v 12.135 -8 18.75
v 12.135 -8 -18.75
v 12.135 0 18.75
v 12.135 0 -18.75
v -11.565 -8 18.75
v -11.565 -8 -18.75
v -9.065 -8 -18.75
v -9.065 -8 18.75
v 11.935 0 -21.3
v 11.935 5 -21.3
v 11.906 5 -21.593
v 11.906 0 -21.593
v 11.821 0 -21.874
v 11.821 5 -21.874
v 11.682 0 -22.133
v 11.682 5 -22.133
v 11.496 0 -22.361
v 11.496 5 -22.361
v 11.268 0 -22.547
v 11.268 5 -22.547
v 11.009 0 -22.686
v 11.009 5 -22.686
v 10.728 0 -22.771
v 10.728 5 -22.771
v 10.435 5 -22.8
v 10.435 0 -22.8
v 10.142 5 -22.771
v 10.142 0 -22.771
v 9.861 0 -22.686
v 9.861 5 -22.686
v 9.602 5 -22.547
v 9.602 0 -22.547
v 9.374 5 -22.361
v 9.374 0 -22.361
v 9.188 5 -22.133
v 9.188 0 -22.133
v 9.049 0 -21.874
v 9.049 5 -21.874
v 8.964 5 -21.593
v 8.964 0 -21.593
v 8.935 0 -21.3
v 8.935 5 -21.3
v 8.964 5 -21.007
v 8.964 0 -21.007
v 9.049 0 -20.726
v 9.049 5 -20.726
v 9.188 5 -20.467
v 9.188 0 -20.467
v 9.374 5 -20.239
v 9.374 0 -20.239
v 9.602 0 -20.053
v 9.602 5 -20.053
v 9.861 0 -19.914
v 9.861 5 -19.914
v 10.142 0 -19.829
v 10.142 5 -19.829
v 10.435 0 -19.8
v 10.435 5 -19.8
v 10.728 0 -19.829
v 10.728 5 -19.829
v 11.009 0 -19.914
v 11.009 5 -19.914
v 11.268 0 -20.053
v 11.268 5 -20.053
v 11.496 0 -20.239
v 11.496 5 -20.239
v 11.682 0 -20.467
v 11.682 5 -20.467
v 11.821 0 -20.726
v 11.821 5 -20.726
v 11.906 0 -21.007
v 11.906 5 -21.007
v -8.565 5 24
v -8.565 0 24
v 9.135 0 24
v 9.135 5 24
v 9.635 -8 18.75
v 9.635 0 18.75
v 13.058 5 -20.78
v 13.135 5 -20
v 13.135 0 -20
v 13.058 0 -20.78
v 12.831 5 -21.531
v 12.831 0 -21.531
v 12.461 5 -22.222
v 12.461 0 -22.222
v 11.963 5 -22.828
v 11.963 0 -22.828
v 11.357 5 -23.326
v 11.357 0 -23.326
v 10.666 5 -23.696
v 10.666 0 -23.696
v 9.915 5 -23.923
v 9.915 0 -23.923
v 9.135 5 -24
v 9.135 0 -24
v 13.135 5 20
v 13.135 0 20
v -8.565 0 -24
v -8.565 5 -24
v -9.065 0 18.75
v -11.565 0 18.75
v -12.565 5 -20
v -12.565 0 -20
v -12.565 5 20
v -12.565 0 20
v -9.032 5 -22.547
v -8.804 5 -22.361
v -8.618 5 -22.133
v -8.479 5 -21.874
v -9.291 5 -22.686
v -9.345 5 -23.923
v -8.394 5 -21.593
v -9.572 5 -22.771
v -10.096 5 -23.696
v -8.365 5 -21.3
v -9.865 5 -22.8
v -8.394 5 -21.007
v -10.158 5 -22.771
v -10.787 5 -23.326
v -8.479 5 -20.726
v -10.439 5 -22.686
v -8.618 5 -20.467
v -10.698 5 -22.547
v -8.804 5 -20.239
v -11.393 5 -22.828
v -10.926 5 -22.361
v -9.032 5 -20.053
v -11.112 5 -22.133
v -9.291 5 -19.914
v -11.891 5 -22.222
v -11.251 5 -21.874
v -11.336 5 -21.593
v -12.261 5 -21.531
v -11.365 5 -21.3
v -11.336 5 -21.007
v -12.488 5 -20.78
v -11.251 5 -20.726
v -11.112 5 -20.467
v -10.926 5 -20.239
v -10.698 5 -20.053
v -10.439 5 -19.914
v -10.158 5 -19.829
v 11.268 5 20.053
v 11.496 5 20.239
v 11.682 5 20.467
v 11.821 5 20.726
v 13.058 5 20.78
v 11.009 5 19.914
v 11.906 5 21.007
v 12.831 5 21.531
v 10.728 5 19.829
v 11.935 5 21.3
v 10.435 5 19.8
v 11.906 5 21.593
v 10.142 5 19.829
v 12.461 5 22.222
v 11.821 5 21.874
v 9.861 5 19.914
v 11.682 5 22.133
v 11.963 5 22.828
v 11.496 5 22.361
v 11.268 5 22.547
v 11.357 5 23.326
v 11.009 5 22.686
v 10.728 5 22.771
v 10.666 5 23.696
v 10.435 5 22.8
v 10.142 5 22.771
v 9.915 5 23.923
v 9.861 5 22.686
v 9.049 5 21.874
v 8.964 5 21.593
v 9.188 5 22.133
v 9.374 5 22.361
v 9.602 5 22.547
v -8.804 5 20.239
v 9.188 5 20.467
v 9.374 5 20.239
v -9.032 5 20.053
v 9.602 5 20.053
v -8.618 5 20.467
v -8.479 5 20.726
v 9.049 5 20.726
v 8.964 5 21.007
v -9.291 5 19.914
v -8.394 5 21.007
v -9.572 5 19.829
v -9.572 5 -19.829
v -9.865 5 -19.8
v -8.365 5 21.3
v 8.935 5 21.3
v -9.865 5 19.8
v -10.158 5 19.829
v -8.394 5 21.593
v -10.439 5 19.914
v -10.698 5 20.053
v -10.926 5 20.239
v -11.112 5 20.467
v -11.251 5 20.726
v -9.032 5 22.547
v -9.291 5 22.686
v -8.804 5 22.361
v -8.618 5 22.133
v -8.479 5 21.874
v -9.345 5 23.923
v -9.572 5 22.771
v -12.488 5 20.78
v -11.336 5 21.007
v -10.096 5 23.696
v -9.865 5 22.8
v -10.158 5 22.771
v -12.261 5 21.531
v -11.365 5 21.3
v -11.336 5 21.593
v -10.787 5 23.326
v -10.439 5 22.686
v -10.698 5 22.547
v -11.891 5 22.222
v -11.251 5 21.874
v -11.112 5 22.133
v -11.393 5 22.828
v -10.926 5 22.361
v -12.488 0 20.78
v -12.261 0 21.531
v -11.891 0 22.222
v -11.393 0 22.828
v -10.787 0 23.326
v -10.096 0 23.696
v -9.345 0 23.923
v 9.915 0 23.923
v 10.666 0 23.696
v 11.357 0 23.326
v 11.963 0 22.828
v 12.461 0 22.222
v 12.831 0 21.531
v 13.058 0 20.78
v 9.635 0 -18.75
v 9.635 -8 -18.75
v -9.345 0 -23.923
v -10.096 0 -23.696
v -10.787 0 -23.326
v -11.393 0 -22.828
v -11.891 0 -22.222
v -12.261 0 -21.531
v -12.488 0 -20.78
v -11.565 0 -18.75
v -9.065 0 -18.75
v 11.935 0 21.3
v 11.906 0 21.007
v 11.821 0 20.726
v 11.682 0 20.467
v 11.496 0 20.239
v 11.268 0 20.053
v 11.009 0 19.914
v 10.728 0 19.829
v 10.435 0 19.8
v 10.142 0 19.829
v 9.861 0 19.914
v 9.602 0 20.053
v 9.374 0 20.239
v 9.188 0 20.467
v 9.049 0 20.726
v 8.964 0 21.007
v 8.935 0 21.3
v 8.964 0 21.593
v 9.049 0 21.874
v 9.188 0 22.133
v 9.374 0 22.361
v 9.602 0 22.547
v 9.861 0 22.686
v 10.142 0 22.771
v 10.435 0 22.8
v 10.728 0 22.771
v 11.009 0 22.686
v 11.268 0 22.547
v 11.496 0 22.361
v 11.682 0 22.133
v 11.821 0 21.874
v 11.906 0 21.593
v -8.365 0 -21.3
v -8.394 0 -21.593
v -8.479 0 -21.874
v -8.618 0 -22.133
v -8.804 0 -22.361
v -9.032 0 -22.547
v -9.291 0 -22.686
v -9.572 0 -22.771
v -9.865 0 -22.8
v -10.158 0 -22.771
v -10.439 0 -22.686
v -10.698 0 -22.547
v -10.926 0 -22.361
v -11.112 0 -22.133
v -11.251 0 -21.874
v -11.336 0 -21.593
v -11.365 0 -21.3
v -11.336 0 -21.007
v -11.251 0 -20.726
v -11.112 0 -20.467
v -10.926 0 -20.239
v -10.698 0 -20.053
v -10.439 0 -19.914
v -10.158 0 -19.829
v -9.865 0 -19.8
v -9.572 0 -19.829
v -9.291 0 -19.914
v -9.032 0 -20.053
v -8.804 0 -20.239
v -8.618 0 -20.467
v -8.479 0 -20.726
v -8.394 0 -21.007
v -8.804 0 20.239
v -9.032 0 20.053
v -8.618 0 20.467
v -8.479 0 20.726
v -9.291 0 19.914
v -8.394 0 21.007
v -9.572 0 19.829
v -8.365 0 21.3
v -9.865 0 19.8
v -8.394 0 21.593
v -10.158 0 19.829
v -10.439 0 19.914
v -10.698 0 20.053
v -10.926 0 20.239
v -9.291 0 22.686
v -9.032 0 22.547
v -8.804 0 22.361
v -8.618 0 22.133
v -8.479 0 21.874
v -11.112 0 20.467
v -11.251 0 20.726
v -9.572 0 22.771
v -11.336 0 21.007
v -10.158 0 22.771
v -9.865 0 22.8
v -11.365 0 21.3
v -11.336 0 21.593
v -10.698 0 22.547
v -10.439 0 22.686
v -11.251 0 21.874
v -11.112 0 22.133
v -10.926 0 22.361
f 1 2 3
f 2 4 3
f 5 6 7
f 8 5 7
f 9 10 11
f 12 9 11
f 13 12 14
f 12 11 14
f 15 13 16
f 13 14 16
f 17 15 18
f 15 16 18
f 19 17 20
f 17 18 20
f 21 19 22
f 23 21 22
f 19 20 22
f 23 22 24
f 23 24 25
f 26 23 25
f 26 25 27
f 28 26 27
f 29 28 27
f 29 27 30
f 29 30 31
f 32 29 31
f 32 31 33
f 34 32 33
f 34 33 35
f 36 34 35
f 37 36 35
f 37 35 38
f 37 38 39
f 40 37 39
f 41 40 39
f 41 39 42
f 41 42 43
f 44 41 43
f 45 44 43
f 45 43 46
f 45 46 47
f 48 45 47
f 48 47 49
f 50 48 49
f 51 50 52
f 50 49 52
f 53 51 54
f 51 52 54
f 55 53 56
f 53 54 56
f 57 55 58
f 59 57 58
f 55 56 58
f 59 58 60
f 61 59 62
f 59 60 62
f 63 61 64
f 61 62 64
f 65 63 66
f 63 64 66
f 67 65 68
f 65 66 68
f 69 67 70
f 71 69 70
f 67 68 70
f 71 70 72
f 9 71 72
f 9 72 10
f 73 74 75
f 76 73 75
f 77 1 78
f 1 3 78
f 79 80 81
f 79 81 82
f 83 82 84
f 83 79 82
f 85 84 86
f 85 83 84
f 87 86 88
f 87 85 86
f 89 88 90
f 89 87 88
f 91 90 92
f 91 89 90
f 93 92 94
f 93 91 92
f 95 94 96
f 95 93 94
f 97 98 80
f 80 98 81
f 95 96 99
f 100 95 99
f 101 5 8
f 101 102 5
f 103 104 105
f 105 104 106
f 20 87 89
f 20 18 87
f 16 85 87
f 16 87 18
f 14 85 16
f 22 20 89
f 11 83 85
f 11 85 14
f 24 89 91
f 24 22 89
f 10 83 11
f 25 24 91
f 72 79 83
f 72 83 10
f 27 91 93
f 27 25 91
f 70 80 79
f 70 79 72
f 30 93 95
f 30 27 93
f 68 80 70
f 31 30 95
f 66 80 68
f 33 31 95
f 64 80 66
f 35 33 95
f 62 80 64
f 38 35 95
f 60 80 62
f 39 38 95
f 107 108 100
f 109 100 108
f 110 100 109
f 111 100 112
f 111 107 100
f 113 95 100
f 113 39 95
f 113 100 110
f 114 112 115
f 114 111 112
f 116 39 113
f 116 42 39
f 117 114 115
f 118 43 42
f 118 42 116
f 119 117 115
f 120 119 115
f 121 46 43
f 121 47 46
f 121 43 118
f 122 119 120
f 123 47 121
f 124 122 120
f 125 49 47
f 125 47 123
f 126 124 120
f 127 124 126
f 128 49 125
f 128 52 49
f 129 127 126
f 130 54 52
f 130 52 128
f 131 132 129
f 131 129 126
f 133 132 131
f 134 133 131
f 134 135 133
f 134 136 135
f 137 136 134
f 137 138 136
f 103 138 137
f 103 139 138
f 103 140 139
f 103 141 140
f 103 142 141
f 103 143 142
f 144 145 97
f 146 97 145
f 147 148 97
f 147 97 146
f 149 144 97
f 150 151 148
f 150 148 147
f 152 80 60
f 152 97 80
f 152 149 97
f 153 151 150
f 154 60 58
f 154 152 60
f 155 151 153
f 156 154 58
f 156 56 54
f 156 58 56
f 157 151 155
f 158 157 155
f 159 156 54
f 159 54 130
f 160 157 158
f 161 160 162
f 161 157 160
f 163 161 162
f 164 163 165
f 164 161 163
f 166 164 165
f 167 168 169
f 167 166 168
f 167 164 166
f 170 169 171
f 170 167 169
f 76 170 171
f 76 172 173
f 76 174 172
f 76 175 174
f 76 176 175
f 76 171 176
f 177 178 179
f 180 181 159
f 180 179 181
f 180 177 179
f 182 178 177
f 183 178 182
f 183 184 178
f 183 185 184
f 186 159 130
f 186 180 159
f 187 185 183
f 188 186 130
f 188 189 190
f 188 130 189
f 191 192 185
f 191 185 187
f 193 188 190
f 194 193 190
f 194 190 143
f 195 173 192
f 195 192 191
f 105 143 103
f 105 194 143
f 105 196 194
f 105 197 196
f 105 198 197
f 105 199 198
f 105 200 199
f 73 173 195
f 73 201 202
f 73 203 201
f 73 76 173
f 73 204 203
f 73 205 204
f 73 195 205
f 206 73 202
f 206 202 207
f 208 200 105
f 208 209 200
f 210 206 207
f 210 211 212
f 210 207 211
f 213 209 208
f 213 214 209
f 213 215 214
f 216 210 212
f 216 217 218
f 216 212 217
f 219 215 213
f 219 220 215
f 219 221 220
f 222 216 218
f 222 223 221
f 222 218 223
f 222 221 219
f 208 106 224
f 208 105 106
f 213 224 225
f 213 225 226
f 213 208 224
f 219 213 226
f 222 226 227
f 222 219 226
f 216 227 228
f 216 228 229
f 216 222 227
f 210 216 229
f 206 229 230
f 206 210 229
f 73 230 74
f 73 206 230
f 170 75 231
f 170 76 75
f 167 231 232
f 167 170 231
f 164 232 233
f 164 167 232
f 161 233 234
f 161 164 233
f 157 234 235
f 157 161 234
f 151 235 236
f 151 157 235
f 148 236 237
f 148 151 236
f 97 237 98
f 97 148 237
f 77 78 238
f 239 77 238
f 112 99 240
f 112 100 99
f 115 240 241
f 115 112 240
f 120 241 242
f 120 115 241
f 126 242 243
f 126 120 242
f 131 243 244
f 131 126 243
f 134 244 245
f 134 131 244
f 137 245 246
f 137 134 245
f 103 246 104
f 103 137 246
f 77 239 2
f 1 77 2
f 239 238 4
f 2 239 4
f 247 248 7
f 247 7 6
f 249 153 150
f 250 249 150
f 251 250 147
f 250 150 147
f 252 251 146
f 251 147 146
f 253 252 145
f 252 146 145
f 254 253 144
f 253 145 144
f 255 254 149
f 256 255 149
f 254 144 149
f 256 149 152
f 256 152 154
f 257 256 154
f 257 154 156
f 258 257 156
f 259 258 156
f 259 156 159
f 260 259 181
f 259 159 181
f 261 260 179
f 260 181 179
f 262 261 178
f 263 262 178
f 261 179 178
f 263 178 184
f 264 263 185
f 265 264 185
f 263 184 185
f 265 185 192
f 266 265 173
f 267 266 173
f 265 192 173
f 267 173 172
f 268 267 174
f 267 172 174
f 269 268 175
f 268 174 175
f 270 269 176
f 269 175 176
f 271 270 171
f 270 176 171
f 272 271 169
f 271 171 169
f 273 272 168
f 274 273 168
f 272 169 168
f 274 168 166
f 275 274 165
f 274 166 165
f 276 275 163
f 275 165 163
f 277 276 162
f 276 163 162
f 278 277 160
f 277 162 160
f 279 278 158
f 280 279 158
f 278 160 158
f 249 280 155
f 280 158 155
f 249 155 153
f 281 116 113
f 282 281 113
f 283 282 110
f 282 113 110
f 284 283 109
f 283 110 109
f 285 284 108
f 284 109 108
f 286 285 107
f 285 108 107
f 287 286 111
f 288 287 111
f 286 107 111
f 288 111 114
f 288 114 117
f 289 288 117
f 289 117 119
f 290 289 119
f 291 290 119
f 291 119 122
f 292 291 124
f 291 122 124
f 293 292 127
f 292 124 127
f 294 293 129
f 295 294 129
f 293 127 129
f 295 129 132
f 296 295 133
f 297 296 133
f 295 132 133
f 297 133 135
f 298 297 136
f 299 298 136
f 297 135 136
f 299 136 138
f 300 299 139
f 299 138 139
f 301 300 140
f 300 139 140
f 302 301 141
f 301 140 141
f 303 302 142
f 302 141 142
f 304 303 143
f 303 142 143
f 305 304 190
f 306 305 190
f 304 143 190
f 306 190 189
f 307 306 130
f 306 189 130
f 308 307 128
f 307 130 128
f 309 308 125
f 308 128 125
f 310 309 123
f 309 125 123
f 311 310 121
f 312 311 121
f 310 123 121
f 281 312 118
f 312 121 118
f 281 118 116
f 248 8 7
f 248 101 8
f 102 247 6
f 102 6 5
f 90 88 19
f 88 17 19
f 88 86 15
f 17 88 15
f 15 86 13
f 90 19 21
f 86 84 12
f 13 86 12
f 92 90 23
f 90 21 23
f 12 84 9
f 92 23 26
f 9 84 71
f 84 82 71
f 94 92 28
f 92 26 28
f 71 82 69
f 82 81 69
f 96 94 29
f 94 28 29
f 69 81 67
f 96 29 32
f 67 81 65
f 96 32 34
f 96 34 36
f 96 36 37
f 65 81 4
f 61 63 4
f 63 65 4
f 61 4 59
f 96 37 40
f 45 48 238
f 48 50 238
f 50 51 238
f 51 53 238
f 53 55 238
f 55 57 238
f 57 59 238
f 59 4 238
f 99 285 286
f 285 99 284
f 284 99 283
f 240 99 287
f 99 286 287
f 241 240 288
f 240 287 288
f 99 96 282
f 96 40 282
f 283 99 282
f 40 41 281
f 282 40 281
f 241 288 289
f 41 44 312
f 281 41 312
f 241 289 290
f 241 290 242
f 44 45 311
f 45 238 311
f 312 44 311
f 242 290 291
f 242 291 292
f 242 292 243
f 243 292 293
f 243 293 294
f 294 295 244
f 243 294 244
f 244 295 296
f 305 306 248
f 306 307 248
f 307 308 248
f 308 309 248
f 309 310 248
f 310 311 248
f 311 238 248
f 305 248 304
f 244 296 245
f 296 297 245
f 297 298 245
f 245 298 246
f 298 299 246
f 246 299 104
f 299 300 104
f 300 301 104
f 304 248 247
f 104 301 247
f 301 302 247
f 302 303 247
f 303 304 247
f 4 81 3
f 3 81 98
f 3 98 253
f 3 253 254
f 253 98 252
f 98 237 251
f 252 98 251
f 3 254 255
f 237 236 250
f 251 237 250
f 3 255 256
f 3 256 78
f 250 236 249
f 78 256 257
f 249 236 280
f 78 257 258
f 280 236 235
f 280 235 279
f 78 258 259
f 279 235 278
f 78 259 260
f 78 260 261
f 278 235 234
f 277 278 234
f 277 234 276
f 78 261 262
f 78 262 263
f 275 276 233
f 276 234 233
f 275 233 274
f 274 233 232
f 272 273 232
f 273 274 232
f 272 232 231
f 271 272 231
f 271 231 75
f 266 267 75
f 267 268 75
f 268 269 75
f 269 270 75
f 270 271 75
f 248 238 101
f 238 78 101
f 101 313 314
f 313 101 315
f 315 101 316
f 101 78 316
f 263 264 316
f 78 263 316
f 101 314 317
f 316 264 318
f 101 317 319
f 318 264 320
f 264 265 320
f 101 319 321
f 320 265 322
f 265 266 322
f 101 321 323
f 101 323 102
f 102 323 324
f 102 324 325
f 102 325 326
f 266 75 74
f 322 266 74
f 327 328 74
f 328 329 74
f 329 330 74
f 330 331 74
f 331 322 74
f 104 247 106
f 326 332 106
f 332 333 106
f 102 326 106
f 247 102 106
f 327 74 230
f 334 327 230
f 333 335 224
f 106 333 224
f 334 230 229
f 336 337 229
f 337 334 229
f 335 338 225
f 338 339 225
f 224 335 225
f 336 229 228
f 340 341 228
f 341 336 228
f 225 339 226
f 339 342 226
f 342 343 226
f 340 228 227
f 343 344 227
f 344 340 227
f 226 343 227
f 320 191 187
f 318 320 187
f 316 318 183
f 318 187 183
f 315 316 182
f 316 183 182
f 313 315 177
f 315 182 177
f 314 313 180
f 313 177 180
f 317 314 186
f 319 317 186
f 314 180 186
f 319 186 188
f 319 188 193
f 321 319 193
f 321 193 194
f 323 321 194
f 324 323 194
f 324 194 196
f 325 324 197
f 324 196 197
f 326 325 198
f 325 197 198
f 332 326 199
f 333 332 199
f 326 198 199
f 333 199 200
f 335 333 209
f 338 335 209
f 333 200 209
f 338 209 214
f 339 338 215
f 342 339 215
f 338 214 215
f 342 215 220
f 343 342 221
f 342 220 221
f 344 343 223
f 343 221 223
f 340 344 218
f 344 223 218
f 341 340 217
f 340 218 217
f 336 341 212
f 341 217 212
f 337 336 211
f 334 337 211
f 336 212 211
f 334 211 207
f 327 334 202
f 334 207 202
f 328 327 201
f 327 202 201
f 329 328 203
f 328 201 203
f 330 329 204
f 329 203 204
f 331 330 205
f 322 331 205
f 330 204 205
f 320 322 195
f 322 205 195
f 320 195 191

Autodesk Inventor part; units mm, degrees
ref_plane "YZ Plane" through (0, 0, 0) normal (1, 0, 0) x (0, 1, 0)
ref_plane "XZ Plane" through (0, 0, 0) normal (0, 1, 0) x (-1, 0, 0)
ref_plane "XY Plane" through (0, 0, 0) normal (0, 0, 1) x (1, 0, 0)
sketch "Boceto1" plane through (0, 0, 0) normal (0, 1, 0) x (-1, 0, 0)
  line L0 (12.565, 24) -> (-13.135, 24)
  line L1 (-13.135, 24) -> (-13.135, -24)
  line L2 (-13.135, -24) -> (12.565, -24)
  line L3 (12.565, -24) -> (12.565, 24)
  point P0 (0, 0)
  point P1 (-0.285, -24)
  dimension "d0" = 48
  dimension "d1" = 25.7
  dimension "d2" = 12.565
  dimension "d3" = 24
extrude "Extrusión1" add sketch "Boceto1" along normal blind 5
fillet "Empalme1" radius 4 3 edges at (13.135, 2.5, 24) (13.135, 2.5, -24) (-12.565, 2.5, 24)
fillet "Empalme2" radius 4 1 edges at (-12.565, 2.5, -24)
sketch "Boceto2" plane through (0, 5, 0) normal (0, 1, 0) x (1, 0, 0)
  circle A0 centre (-9.865, -21.3) radius 1.5
  line L0 (-8.565, -24) -> (9.135, -24) projected
  line L1 (-12.565, 20) -> (-12.565, -20) projected
  line L2 (-31.929, 0) -> (35.0281, 0)
  circle A1 centre (-9.865, 21.3) radius 1.5
  line L3 (0.285, 24.6166) -> (0.285, -27.3805)
  circle A2 centre (10.435, -21.3) radius 1.5
  circle A3 centre (10.435, 21.3) radius 1.5
  line L4 (13.135, -20) -> (13.135, 20) projected
  line L5 (9.135, 24) -> (-8.565, 24) projected
  point P0 (0, 0)
  dimension "d8" = 3
  dimension "d9" = 2.7
  dimension "d10" = 2.7
  dimension "d21" = 2.7
  dimension "d22" = 2.7
extrude "Extrusión2" cut sketch "Boceto2" against normal blind 10
sketch "Boceto3" plane through (0, 0, 0) normal (0, -1, 0) x (1, 0, 0)
  line L0 (-11.565, 18.75) -> (-9.065, 18.75)
  line L1 (-9.065, 18.75) -> (-9.065, -18.75)
  line L2 (-9.065, -18.75) -> (-11.565, -18.75)
  line L3 (-11.565, -18.75) -> (-11.565, 18.75)
  line L4 (0.285, 27.3547) -> (0.285, -28.7593)
  line L5 (-12.565, -20) -> (-12.565, 20) projected
  line L6 (-8.565, 24) -> (9.135, 24) projected
  line L7 (9.135, -24) -> (-8.565, -24) projected
  line L8 (12.135, 18.75) -> (9.635, 18.75)
  line L9 (9.635, 18.75) -> (9.635, -18.75)
  line L10 (9.635, -18.75) -> (12.135, -18.75)
  line L11 (12.135, -18.75) -> (12.135, 18.75)
  line L12 (13.135, 20) -> (13.135, -20) projected
  point P0 (0, 0)
  point P1 (-10.315, 18.75)
  point P2 (-10.315, -18.75)
  point P3 (10.885, 18.75)
  point P4 (10.885, -18.75)
  dimension "d13" = 37.5
  dimension "d14" = 2.5
  dimension "d15" = 1
  dimension "d16" = 5.25
  dimension "d17" = 5.25
  dimension "d18" = 1
extrude "Extrusión3" add sketch "Boceto3" along normal blind 8
equation "\"Radio_pliegue\" = Grosor"
equation "\"Anchura_desahogo_plegado\" = Grosor"
equation "\"Profundidad_desahogo_plegado\" = 0.5 * Grosor"
equation "\"Tamaño_destalonado\" = 4 * Grosor"
equation "\"Remanente_mínimo\" = 2 * Grosor"
equation "\"Radiodetransición\" = Radio_pliegue"
equation "\"Tamaño_de_radio_de_Jacobi\" = Radio_pliegue"
equation "\"TamañoSeparación\" = Grosor"
equation "\"Grosor\" = 0.5"
properties part number "ESP_8266"
